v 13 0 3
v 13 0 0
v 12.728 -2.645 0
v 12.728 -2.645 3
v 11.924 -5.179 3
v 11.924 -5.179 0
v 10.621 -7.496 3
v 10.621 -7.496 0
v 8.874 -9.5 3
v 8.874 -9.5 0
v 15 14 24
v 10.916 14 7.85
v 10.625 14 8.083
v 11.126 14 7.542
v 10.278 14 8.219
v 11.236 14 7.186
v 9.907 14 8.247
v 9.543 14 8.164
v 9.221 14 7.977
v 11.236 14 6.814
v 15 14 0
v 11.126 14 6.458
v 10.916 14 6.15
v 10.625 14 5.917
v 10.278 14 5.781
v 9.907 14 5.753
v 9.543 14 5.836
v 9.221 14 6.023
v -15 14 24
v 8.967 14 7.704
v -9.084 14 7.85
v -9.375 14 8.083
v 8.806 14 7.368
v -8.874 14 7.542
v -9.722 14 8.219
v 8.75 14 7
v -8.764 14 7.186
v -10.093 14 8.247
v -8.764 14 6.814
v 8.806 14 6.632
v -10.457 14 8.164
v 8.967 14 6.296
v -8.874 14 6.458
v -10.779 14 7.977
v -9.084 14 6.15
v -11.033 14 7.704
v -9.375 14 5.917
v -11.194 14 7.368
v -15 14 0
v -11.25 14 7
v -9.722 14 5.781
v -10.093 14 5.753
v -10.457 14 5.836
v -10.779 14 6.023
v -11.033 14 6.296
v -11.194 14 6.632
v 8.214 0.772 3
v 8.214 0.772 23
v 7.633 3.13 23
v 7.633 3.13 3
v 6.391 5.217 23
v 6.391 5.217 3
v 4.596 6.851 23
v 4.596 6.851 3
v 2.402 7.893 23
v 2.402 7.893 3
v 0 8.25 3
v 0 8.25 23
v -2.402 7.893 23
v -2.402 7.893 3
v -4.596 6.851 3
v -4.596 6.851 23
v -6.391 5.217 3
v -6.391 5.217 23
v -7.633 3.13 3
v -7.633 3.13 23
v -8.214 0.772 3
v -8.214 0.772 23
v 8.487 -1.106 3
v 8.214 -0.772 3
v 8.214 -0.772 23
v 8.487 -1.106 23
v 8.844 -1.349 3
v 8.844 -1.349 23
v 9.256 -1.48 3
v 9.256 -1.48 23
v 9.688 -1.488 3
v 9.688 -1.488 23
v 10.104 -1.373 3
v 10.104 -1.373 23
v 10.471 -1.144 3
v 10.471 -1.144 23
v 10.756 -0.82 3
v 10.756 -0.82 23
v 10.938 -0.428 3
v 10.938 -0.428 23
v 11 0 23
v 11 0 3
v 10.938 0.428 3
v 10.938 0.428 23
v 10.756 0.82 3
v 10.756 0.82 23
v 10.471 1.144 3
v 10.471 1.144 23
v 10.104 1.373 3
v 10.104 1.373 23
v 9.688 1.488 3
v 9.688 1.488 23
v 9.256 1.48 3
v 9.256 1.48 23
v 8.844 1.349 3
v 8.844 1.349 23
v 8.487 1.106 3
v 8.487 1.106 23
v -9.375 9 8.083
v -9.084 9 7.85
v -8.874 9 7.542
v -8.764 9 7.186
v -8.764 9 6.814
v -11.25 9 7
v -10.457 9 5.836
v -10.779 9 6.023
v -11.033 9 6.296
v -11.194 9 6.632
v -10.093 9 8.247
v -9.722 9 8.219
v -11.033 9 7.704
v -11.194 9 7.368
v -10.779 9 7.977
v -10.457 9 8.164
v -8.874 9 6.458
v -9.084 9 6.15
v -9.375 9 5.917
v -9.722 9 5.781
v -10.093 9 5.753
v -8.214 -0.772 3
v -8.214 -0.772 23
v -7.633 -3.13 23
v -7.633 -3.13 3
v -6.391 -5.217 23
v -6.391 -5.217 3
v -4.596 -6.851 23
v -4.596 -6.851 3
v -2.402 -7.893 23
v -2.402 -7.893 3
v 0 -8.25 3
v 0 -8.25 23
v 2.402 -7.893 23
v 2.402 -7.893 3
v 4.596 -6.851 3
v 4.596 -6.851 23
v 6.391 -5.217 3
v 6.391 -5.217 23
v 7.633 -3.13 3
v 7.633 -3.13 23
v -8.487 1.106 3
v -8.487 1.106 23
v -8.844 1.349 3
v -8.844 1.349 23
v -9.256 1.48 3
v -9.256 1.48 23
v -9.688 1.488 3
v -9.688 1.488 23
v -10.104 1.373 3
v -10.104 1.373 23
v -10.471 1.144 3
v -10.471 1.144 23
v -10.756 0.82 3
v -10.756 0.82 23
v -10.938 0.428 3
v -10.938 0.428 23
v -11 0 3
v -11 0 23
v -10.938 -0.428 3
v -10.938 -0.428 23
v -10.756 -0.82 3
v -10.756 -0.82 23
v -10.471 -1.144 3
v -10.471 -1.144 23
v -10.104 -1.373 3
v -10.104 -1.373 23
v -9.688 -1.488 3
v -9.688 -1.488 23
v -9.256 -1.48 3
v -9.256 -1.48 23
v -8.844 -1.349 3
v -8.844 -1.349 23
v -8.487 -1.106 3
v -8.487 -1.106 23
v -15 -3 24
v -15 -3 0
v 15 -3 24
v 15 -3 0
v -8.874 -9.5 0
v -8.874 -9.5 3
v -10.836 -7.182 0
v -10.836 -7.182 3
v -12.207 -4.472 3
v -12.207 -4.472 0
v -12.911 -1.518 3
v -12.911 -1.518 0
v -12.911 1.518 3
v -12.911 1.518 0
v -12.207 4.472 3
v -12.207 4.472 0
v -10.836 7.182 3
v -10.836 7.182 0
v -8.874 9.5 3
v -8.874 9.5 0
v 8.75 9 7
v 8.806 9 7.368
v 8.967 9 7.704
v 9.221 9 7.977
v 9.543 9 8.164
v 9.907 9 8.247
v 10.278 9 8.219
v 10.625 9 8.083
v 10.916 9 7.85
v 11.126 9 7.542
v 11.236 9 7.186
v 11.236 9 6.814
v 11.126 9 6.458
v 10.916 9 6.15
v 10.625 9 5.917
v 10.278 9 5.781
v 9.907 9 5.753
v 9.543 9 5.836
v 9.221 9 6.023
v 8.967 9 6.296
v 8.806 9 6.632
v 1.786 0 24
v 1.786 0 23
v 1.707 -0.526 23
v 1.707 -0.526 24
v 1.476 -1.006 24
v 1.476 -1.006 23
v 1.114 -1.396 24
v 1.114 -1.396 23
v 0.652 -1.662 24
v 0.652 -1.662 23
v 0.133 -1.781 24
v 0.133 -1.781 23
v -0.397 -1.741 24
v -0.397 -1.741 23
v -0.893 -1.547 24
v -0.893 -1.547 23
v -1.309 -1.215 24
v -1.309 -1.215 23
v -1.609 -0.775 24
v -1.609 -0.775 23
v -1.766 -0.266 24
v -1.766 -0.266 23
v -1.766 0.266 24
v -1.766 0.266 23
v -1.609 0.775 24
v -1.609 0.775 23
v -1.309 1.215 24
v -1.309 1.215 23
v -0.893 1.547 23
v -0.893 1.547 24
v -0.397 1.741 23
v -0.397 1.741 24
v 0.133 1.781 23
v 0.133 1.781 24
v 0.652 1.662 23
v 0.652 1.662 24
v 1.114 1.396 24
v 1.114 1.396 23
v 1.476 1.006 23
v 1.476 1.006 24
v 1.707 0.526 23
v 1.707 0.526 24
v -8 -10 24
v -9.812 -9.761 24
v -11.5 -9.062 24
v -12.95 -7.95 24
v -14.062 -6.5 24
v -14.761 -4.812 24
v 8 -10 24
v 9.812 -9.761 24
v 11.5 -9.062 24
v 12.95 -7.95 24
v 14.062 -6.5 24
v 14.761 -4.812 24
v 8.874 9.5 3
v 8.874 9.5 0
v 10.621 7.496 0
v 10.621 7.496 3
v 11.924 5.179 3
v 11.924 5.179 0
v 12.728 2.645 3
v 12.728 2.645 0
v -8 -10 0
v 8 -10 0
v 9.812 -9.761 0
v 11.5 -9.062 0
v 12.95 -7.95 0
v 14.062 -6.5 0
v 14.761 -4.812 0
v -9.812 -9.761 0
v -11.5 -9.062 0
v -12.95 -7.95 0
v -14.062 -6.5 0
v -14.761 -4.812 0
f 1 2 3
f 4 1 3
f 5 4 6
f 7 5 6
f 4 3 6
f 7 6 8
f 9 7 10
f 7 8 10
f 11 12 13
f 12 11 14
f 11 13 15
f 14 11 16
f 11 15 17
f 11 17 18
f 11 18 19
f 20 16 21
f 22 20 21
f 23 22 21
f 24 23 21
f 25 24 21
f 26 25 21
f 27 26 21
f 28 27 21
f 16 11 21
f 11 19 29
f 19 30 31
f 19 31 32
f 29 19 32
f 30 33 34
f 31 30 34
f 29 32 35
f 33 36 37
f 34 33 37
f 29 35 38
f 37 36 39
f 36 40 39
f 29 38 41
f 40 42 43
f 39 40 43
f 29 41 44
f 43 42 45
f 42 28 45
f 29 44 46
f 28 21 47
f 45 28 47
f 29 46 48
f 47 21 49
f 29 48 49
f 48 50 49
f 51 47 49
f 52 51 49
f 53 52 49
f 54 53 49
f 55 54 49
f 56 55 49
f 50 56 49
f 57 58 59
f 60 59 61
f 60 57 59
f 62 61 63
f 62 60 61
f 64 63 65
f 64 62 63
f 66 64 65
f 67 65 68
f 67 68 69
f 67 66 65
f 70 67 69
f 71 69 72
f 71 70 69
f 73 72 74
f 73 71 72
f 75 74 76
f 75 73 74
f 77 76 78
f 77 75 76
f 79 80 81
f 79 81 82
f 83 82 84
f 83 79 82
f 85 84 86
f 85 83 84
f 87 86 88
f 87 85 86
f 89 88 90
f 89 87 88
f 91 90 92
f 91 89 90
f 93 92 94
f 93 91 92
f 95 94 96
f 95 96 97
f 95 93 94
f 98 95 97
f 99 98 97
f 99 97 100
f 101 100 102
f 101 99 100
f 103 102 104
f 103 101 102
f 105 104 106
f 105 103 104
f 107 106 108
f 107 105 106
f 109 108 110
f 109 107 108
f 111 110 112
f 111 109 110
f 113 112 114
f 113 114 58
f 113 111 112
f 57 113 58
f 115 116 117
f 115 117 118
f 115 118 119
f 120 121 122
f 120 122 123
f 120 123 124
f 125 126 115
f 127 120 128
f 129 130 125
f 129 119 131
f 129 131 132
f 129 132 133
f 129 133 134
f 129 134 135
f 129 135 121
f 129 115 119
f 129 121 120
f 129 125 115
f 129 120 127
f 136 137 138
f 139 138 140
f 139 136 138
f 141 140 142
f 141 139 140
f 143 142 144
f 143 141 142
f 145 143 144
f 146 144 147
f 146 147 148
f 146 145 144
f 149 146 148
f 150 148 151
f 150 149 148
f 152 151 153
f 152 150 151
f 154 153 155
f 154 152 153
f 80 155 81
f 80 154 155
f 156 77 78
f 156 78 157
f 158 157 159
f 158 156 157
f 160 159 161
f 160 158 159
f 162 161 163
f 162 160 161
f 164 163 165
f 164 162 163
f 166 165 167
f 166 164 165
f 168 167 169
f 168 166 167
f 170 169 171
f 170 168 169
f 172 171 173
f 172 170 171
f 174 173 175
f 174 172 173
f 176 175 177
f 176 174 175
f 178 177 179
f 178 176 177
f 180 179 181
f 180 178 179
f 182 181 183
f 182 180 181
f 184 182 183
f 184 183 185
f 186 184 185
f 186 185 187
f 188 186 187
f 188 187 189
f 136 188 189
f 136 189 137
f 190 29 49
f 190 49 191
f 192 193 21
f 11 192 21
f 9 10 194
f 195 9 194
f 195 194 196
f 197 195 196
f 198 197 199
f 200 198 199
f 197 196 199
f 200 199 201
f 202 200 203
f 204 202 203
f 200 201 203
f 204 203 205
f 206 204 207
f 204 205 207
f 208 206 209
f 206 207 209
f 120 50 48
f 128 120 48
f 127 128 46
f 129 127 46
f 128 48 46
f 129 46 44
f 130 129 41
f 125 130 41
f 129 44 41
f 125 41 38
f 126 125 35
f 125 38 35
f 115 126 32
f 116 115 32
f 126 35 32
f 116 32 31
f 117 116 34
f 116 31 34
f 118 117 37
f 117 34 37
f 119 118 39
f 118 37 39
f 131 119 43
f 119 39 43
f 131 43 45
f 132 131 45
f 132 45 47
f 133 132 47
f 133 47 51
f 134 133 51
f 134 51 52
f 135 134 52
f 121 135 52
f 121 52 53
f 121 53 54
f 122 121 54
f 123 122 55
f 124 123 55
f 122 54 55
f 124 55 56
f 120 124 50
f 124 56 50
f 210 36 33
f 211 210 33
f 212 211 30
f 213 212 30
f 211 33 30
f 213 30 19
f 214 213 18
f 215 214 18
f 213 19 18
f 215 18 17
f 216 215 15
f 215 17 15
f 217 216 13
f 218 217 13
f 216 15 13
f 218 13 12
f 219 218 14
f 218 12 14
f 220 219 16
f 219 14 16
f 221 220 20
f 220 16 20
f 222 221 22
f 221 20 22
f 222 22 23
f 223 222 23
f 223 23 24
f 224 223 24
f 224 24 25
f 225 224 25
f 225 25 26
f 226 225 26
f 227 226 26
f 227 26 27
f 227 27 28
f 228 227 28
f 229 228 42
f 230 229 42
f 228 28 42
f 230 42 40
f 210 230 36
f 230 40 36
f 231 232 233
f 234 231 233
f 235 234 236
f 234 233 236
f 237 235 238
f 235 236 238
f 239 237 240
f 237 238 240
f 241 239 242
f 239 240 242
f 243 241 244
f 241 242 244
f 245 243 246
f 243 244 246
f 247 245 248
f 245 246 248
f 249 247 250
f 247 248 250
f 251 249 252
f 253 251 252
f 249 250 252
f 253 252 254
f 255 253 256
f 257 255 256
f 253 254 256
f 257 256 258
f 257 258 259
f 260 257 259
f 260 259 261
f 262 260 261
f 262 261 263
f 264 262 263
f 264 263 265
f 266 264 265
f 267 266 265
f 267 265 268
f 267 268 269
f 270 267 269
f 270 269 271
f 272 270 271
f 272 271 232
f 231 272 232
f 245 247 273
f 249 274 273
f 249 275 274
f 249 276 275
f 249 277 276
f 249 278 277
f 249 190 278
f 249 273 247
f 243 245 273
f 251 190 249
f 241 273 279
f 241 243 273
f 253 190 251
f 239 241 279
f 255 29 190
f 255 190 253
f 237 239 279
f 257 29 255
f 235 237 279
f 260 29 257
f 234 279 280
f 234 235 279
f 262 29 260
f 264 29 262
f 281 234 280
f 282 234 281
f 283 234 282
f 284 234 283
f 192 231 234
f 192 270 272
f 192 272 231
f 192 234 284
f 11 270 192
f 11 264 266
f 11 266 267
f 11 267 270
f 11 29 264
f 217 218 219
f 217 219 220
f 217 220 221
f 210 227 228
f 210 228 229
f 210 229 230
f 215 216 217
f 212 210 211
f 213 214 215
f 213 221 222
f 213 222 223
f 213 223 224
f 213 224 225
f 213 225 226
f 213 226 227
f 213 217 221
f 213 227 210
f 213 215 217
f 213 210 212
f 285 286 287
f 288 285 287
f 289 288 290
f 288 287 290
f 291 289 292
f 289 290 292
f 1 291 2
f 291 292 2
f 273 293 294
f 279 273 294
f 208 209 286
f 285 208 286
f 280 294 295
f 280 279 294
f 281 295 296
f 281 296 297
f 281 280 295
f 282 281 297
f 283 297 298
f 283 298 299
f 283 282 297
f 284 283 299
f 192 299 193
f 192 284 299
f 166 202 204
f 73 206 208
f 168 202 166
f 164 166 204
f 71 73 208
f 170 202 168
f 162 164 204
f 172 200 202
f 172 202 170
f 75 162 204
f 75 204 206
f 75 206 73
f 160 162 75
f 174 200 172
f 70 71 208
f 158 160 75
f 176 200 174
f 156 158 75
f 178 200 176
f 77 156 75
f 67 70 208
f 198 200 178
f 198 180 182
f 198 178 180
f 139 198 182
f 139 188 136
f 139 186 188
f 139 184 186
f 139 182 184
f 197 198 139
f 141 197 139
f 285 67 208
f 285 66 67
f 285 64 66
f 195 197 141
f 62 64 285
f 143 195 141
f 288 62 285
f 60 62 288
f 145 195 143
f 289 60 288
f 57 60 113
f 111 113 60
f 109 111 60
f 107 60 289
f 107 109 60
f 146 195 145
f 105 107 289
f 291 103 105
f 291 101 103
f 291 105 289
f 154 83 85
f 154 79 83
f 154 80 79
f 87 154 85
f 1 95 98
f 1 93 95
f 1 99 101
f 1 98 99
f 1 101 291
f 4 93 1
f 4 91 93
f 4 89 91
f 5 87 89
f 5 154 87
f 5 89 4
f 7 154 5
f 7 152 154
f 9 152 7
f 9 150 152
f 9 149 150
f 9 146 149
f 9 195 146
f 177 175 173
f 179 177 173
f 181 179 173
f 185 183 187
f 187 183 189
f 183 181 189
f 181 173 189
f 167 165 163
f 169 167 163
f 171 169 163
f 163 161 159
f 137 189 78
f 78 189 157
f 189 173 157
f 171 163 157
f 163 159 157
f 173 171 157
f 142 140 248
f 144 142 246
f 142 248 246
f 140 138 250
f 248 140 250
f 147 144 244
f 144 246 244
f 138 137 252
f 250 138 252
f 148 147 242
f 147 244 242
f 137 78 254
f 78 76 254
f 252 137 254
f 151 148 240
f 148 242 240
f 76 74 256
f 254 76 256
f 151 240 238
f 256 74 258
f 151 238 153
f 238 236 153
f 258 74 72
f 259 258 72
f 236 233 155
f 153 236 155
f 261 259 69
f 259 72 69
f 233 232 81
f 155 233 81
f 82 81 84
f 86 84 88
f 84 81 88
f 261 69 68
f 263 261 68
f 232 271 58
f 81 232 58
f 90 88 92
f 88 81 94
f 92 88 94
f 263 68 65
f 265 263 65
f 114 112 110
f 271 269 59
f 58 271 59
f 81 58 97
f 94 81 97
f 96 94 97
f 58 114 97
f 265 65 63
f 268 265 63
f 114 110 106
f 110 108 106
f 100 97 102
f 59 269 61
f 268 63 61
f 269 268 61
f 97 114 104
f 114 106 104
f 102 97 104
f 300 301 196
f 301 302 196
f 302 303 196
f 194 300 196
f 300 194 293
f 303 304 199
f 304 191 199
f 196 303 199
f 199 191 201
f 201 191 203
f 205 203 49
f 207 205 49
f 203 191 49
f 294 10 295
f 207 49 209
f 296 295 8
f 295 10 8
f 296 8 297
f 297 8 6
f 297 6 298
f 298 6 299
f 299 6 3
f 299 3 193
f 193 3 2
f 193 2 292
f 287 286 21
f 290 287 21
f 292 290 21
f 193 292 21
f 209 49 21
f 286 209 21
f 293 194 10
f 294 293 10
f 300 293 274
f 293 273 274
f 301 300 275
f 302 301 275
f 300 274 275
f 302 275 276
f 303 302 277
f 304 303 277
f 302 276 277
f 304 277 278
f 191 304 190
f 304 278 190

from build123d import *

# Parameters (mm, degrees)
F1_DEPTH = 24
F3_DEPTH = 23
F4_R     = 1.7859375
F5_DEPTH = 25
F7_DEPTH = 3
F8_R     = 1.25
F9_DEPTH = 5
F10_R    = 7


with BuildPart() as f1:
    # F0 (on Top) → F1 (new body)
    with BuildSketch(Plane.XY):
        Polygon((-15, -10), (15, -10), (15, 0), (15, 10), (15, 14), (-15, 14), (-15, 10), (-15, 0), align=None)
    extrude(amount=F1_DEPTH)

    # F2 (on Top) → F3 (cut)
    with BuildSketch(Plane.XY):
        with BuildLine():
            ThreePointArc((-8.2138157895, 0.7718355891), (-8.0544419216, 0.4004520472), (-8, 0))
            ThreePointArc((-8, 0), (-8.0544419216, -0.4004520472), (-8.2138157895, -0.7718355891))
            ThreePointArc((-8.2138157895, -0.7718355891), (0, -8.25), (8.2138157895, -0.7718355891))
            ThreePointArc((8.2138157895, -0.7718355891), (8, 0), (8.2138157895, 0.7718355891))
            ThreePointArc((8.2138157895, 0.7718355891), (0, 8.25), (-8.2138157895, 0.7718355891))
        make_face()
        with BuildLine():
            ThreePointArc((-8.2138157895, -0.7718355891), (-8.25, 0), (-8.2138157895, 0.7718355891))
            ThreePointArc((-8.2138157895, 0.7718355891), (-11, 0), (-8.2138157895, -0.7718355891))
        make_face()
        with BuildLine():
            ThreePointArc((-8.2138157895, -0.7718355891), (-8.0544419216, -0.4004520472), (-8, 0))
            ThreePointArc((-8, 0), (-8.0544419216, 0.4004520472), (-8.2138157895, 0.7718355891))
            ThreePointArc((-8.2138157895, 0.7718355891), (-8.25, 0), (-8.2138157895, -0.7718355891))
        make_face()
        with BuildLine():
            ThreePointArc((8.25, 0), (8.2409489825, 0.3863416473), (8.2138157895, 0.7718355891))
            ThreePointArc((8.2138157895, 0.7718355891), (8, 0), (8.2138157895, -0.7718355891))
            ThreePointArc((8.2138157895, -0.7718355891), (8.2409489825, -0.3863416473), (8.25, 0))
        make_face()
        with BuildLine():
            ThreePointArc((11, 0), (9.9004520472, 1.4455580784), (8.2138157895, 0.7718355891))
            ThreePointArc((8.2138157895, 0.7718355891), (8.2409489825, 0.3863416473), (8.25, 0))
            ThreePointArc((8.25, 0), (8.2409489825, -0.3863416473), (8.2138157895, -0.7718355891))
            ThreePointArc((8.2138157895, -0.7718355891), (9.9004520472, -1.4455580784), (11, 0))
        make_face()
    extrude(amount=F3_DEPTH, mode=Mode.SUBTRACT)

    # F4 (on face) → F5 (cut)
    with BuildSketch(Plane(origin=(0, 0, 23), x_dir=(1, 0, 0), z_dir=(0, 0, -1))):
        Circle(F4_R)
    extrude(amount=-F5_DEPTH, mode=Mode.SUBTRACT)

    # F6 (on face) → F7 (cut)
    with BuildSketch(Plane(origin=(0, 0, 0), x_dir=(1, 0, 0), z_dir=(0, 0, -1))):
        with BuildLine():
            ThreePointArc((8.8741196746, -9.5), (11.9240000791, -5.1786312974), (13, 0))
            ThreePointArc((13, 0), (11.9240000791, 5.1786312974), (8.8741196746, 9.5))
            Line((8.8741196746, 9.5), (8.8741196746, 1.3631851739))
            ThreePointArc((8.8741196746, 1.3631851739), (11, 0), (8.8741196746, -1.3631851739))
            Line((8.8741196746, -1.3631851739), (8.8741196746, -9.5))
        make_face()
        with BuildLine():
            Line((8.8741196746, 1.3631851739), (8.8741196746, 9.5))
            Line((8.8741196746, 9.5), (-8.8741196746, 9.5))
            Line((-8.8741196746, 9.5), (-8.8741196746, 1.3631851739))
            ThreePointArc((-8.8741196746, 1.3631851739), (-8.4992896122, 1.1173981921), (-8.2138157895, 0.7718355891))
            ThreePointArc((-8.2138157895, 0.7718355891), (0, 8.25), (8.2138157895, 0.7718355891))
            ThreePointArc((8.2138157895, 0.7718355891), (8.4992896122, 1.1173981921), (8.8741196746, 1.3631851739))
        make_face()
        with BuildLine():
            Line((-8.8741196746, -9.5), (8.8741196746, -9.5))
            Line((8.8741196746, -9.5), (8.8741196746, -1.3631851739))
            ThreePointArc((8.8741196746, -1.3631851739), (8.4992896122, -1.1173981921), (8.2138157895, -0.7718355891))
            ThreePointArc((8.2138157895, -0.7718355891), (0, -8.25), (-8.2138157895, -0.7718355891))
            ThreePointArc((-8.2138157895, -0.7718355891), (-8.4992896122, -1.1173981921), (-8.8741196746, -1.3631851739))
            Line((-8.8741196746, -1.3631851739), (-8.8741196746, -9.5))
        make_face()
        with BuildLine():
            Line((-8.8741196746, 1.3631851739), (-8.8741196746, 9.5))
            ThreePointArc((-8.8741196746, 9.5), (-13, 0), (-8.8741196746, -9.5))
            Line((-8.8741196746, -9.5), (-8.8741196746, -1.3631851739))
            ThreePointArc((-8.8741196746, -1.3631851739), (-11, 0), (-8.8741196746, 1.3631851739))
        make_face()
        with BuildLine():
            ThreePointArc((8.8741196746, -1.3631851739), (11, 0), (8.8741196746, 1.3631851739))
            Line((8.8741196746, 1.3631851739), (8.8741196746, -1.3631851739))
        make_face()
        with BuildLine():
            Line((8.8741196746, -1.3631851739), (8.8741196746, 1.3631851739))
            ThreePointArc((8.8741196746, 1.3631851739), (8.4992896122, 1.1173981921), (8.2138157895, 0.7718355891))
            ThreePointArc((8.2138157895, 0.7718355891), (0, 8.25), (-8.2138157895, 0.7718355891))
            ThreePointArc((-8.2138157895, 0.7718355891), (-8.4992896122, 1.1173981921), (-8.8741196746, 1.3631851739))
            Line((-8.8741196746, 1.3631851739), (-8.8741196746, -1.3631851739))
            ThreePointArc((-8.8741196746, -1.3631851739), (-8.4992896122, -1.1173981921), (-8.2138157895, -0.7718355891))
            ThreePointArc((-8.2138157895, -0.7718355891), (0, -8.25), (8.2138157895, -0.7718355891))
            ThreePointArc((8.2138157895, -0.7718355891), (8.4992896122, -1.1173981921), (8.8741196746, -1.3631851739))
        make_face()
        with BuildLine():
            Line((-8.8741196746, -1.3631851739), (-8.8741196746, 1.3631851739))
            ThreePointArc((-8.8741196746, 1.3631851739), (-11, 0), (-8.8741196746, -1.3631851739))
        make_face()
    extrude(amount=-F7_DEPTH, mode=Mode.SUBTRACT)

    # F8 (on face) → F9 (cut)
    with BuildSketch(Plane(origin=(0, 14, 0), x_dir=(-1, 0, 0), z_dir=(0, 1, 0))):
        with Locations((-10, 7)):
            Circle(F8_R)
        with Locations((10, 7)):
            Circle(F8_R)
    extrude(amount=-F9_DEPTH, mode=Mode.SUBTRACT)

    # F10
    f10_edges = [f1.edges().sort_by_distance(p)[0] for p in [
        (-15, -10, 12),
        (15, -10, 12),
    ]]
    fillet(f10_edges, radius=F10_R)


solid = f1.part
